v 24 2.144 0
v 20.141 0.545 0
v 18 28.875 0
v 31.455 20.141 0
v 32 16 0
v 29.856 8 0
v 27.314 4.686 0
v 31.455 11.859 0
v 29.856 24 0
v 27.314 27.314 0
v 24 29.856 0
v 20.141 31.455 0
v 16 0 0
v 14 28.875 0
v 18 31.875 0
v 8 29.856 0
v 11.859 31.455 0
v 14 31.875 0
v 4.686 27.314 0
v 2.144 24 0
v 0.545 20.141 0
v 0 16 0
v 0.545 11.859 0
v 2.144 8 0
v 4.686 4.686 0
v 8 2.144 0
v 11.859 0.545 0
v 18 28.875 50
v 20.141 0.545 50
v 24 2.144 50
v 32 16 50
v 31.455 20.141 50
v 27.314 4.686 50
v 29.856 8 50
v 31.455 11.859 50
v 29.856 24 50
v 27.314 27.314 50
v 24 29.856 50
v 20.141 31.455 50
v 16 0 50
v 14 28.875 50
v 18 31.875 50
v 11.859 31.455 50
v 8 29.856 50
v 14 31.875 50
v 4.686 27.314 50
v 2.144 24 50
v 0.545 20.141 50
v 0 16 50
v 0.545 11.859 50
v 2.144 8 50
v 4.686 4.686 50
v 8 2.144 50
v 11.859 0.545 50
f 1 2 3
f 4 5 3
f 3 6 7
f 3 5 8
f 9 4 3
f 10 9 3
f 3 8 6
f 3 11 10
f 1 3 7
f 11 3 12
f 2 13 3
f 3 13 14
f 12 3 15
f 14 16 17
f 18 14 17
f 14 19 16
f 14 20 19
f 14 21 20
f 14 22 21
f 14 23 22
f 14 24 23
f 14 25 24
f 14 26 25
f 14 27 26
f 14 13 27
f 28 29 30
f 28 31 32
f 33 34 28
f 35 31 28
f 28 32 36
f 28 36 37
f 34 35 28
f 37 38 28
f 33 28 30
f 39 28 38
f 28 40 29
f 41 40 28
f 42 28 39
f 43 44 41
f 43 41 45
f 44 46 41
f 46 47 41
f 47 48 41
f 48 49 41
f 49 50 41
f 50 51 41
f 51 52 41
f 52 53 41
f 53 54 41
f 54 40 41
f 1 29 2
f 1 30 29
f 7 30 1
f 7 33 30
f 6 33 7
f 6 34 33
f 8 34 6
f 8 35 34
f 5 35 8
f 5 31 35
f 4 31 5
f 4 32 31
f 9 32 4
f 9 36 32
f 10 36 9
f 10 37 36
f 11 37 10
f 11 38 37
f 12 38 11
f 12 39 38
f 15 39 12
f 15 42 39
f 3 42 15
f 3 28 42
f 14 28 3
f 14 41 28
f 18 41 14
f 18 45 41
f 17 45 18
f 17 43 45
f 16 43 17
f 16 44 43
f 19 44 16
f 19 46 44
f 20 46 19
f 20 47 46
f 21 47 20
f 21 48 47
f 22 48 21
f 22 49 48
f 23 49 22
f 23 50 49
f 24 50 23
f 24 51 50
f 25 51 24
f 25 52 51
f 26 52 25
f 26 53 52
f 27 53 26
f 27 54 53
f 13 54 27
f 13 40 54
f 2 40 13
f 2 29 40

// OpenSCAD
$fn = 32;

// ----------------------------------------------------------------------
// Keyway shaft: d32 shaft, key 4 x 3 mm
// ----------------------------------------------------------------------

// --- parameters (mm) ---
shaft_r = 16;             // shaft radius
key_w = 4;                // keyway width
key_d = 3;                // keyway depth below the surface line
plate_t = 50;             // shaft length, Z (extrusion height)
fit_tol = 0.05;           // declared fit tolerance (prompt contract)
free_tol = 0.3;           // declared free tolerance (prompt contract)

shaft_d = 2 * shaft_r;  // shaft diameter
circle_step = 15;  // polygon sampling step, degrees

profile = [[11.859, 31.455], [8, 29.856], [4.686, 27.314], [2.144, 24], [0.545, 20.141], [0, 16], [0.545, 11.859], [2.144, 8], [4.686, 4.686], [8, 2.144], [11.859, 0.545], [16, 0], [20.141, 0.545], [24, 2.144], [27.314, 4.686], [29.856, 8], [31.455, 11.859], [32, 16], [31.455, 20.141], [29.856, 24], [27.314, 27.314], [24, 29.856], [20.141, 31.455], [18, 31.875], [18, 28.875], [14, 28.875], [14, 31.875]];  // primary outline, 27 points, counter clockwise

// --- the one profile operation ---
linear_extrude(height = plate_t) polygon(points = profile);
